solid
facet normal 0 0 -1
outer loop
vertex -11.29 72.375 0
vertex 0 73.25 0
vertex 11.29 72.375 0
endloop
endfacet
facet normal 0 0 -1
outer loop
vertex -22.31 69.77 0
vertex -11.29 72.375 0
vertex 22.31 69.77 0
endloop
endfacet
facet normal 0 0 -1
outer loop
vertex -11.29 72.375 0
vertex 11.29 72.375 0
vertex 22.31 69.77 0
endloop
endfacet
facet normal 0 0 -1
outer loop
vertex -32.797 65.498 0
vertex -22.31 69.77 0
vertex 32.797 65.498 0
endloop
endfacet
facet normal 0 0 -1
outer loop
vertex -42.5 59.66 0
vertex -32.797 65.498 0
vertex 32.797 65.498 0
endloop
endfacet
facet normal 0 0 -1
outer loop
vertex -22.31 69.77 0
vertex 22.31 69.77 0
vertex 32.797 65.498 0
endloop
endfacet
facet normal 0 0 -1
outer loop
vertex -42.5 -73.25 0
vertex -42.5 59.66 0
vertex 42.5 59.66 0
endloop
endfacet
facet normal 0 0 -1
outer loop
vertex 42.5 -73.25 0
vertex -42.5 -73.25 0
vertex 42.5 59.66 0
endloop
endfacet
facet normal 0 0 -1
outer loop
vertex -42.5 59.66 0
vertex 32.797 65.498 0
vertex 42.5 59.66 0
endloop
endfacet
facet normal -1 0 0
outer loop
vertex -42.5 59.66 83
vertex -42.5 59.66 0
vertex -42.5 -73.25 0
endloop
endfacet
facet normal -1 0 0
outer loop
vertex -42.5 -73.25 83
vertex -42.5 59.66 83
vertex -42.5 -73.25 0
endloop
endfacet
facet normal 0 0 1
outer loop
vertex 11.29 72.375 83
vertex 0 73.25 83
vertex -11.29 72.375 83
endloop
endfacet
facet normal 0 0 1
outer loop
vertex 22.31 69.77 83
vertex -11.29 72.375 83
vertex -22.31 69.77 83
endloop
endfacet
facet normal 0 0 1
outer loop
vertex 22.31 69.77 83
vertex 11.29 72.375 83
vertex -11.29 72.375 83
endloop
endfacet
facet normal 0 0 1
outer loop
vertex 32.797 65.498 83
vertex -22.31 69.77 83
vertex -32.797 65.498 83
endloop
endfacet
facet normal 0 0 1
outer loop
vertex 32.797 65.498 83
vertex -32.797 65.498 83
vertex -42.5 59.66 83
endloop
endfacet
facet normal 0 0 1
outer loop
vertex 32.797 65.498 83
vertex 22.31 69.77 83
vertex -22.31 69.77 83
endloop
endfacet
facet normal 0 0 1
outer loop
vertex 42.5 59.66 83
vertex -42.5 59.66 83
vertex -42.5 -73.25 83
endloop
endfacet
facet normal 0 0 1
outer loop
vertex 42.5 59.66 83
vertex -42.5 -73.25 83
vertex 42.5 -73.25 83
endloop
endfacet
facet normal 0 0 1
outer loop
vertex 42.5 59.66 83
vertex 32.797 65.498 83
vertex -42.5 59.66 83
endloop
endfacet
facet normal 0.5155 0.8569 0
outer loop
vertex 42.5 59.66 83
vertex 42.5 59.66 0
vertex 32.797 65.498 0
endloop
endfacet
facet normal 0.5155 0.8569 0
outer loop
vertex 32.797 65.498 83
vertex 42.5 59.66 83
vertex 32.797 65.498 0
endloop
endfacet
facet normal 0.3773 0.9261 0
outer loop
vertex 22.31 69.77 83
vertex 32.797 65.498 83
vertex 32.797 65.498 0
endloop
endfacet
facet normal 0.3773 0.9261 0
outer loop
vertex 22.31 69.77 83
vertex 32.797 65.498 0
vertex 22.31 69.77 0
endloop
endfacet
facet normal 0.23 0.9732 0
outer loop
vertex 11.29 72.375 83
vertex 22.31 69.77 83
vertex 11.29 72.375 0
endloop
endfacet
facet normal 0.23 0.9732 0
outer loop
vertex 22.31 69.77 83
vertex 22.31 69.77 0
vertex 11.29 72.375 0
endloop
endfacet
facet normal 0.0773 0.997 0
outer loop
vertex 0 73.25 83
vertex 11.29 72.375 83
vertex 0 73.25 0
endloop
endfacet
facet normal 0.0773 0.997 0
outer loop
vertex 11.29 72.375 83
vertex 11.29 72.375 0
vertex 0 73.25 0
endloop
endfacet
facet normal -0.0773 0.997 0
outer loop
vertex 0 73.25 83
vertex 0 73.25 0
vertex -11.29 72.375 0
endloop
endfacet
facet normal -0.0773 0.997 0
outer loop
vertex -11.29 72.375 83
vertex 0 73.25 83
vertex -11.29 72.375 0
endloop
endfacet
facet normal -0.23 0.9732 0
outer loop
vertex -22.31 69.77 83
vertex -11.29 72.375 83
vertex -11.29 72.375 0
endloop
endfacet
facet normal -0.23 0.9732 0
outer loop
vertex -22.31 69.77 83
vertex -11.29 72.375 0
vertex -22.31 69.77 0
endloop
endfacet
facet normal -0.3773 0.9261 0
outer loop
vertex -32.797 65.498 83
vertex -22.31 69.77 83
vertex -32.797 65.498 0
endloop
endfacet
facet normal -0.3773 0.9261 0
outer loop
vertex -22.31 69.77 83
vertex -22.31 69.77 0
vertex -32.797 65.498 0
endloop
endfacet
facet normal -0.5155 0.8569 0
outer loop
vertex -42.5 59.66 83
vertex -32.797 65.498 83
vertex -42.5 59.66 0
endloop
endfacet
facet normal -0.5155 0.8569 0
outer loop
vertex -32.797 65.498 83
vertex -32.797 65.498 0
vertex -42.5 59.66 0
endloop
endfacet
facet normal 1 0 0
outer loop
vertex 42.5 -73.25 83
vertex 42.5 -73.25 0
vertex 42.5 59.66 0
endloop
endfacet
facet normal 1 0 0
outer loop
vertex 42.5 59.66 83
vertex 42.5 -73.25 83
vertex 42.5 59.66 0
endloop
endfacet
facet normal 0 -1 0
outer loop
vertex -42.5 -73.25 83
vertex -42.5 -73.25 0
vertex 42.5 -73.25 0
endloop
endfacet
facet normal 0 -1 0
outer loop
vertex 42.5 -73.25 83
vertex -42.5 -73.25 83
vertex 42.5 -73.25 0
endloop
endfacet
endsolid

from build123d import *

# Parameters (mm, degrees)
EXTRUDE_1_DEPTH = 83


with BuildPart() as part:
    # 草图1 → 凸台-拉伸1 (new body)
    with BuildSketch(Plane.XY):
        with BuildLine():
            ThreePointArc((42.5, 59.659974019), (22.309968658, 69.769820112), (0, 73.25))
            ThreePointArc((0, 73.25), (-22.309968658, 69.769820112), (-42.5, 59.659974019))
            Line((-42.5, 59.659974019), (-42.5, -59.659974019))
            ThreePointArc((-42.5, -59.659974019), (-22.309968513, -69.769820159), (3.06e-07, -73.25))
            ThreePointArc((3.06e-07, -73.25), (22.309968804, -69.769820065), (42.5, -59.659974019))
            Line((42.5, -59.659974019), (42.5, 59.659974019))
        make_face()
        with BuildLine():
            Line((42.5, -73.25), (42.5, -59.659974019))
            ThreePointArc((42.5, -59.659974019), (22.309968804, -69.769820065), (3.06e-07, -73.25))
            Line((3.06e-07, -73.25), (42.5, -73.25))
        make_face()
        with BuildLine():
            ThreePointArc((3.06e-07, -73.25), (-22.309968513, -69.769820159), (-42.5, -59.659974019))
            Line((-42.5, -59.659974019), (-42.5, -73.25))
            Line((-42.5, -73.25), (3.06e-07, -73.25))
        make_face()
    extrude(amount=EXTRUDE_1_DEPTH)


solid = part.part
